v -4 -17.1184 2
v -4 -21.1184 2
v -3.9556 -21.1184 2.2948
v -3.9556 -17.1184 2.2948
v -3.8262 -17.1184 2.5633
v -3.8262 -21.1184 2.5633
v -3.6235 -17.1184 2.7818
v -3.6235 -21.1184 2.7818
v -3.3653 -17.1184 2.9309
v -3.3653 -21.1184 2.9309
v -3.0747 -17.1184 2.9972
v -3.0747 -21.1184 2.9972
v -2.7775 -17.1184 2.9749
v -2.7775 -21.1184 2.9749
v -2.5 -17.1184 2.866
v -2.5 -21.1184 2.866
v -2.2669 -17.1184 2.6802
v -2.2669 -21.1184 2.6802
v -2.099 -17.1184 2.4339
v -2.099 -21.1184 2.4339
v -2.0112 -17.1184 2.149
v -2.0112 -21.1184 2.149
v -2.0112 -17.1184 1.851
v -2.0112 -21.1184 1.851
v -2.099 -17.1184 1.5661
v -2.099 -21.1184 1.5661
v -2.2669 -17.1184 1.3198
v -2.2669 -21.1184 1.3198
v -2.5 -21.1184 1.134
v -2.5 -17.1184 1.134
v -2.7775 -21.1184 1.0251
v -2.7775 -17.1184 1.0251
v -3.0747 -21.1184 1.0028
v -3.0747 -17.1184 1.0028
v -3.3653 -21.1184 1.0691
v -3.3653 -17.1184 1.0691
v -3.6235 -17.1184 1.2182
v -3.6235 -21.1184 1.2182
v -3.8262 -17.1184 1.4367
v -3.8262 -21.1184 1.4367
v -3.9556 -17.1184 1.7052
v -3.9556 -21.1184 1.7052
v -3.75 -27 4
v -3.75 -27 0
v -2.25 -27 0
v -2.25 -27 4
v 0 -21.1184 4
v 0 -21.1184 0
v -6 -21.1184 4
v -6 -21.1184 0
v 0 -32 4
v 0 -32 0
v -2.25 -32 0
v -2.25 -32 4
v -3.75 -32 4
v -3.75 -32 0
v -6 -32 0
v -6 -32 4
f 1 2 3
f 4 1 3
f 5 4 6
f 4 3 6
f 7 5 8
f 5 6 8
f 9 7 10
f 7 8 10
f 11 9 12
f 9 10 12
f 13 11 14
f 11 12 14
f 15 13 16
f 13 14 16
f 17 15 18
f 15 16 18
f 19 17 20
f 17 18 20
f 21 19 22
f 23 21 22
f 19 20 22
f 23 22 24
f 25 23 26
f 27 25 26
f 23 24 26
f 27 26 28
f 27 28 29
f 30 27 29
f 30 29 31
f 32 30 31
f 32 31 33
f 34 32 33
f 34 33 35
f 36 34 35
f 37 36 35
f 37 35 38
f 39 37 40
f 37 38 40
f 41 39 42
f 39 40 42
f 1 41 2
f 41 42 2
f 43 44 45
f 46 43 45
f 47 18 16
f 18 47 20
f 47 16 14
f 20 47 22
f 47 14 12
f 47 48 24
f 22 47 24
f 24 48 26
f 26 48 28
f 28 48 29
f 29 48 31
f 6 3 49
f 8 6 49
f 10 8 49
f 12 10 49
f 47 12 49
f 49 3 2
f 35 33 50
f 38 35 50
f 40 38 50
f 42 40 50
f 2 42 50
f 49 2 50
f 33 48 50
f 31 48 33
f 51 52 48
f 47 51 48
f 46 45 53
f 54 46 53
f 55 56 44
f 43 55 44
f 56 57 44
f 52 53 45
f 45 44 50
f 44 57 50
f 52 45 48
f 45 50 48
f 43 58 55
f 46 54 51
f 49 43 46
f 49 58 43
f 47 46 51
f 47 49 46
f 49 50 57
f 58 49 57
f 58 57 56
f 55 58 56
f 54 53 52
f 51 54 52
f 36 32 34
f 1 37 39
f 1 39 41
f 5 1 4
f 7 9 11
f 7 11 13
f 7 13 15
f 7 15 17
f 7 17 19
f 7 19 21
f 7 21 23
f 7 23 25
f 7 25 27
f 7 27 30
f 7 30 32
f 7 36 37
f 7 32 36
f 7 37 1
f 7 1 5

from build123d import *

# Parameters (mm, degrees)
F1_DEPTH = 4
F2_R     = 1
F3_DEPTH = 4


with BuildPart() as f1:
    # F0 (on Top) → F1 (new body)
    with BuildSketch(Plane.XY):
        Polygon((-3.75, -32), (-3.75, -27), (-2.25, -27), (-2.25, -32), (0, -32), (0, -21.280894), (0, -21.118362), (-6, -21.118362), (-6, -32), align=None)
    extrude(amount=F1_DEPTH)

    # F2 (on face) → F3 (join)
    with BuildSketch(Plane(origin=(0, -21.118362, 0), x_dir=(-1, 0, 0), z_dir=(0, 1, 0))):
        with Locations((3, 2)):
            Circle(F2_R)
    extrude(amount=F3_DEPTH)


solid = f1.part
